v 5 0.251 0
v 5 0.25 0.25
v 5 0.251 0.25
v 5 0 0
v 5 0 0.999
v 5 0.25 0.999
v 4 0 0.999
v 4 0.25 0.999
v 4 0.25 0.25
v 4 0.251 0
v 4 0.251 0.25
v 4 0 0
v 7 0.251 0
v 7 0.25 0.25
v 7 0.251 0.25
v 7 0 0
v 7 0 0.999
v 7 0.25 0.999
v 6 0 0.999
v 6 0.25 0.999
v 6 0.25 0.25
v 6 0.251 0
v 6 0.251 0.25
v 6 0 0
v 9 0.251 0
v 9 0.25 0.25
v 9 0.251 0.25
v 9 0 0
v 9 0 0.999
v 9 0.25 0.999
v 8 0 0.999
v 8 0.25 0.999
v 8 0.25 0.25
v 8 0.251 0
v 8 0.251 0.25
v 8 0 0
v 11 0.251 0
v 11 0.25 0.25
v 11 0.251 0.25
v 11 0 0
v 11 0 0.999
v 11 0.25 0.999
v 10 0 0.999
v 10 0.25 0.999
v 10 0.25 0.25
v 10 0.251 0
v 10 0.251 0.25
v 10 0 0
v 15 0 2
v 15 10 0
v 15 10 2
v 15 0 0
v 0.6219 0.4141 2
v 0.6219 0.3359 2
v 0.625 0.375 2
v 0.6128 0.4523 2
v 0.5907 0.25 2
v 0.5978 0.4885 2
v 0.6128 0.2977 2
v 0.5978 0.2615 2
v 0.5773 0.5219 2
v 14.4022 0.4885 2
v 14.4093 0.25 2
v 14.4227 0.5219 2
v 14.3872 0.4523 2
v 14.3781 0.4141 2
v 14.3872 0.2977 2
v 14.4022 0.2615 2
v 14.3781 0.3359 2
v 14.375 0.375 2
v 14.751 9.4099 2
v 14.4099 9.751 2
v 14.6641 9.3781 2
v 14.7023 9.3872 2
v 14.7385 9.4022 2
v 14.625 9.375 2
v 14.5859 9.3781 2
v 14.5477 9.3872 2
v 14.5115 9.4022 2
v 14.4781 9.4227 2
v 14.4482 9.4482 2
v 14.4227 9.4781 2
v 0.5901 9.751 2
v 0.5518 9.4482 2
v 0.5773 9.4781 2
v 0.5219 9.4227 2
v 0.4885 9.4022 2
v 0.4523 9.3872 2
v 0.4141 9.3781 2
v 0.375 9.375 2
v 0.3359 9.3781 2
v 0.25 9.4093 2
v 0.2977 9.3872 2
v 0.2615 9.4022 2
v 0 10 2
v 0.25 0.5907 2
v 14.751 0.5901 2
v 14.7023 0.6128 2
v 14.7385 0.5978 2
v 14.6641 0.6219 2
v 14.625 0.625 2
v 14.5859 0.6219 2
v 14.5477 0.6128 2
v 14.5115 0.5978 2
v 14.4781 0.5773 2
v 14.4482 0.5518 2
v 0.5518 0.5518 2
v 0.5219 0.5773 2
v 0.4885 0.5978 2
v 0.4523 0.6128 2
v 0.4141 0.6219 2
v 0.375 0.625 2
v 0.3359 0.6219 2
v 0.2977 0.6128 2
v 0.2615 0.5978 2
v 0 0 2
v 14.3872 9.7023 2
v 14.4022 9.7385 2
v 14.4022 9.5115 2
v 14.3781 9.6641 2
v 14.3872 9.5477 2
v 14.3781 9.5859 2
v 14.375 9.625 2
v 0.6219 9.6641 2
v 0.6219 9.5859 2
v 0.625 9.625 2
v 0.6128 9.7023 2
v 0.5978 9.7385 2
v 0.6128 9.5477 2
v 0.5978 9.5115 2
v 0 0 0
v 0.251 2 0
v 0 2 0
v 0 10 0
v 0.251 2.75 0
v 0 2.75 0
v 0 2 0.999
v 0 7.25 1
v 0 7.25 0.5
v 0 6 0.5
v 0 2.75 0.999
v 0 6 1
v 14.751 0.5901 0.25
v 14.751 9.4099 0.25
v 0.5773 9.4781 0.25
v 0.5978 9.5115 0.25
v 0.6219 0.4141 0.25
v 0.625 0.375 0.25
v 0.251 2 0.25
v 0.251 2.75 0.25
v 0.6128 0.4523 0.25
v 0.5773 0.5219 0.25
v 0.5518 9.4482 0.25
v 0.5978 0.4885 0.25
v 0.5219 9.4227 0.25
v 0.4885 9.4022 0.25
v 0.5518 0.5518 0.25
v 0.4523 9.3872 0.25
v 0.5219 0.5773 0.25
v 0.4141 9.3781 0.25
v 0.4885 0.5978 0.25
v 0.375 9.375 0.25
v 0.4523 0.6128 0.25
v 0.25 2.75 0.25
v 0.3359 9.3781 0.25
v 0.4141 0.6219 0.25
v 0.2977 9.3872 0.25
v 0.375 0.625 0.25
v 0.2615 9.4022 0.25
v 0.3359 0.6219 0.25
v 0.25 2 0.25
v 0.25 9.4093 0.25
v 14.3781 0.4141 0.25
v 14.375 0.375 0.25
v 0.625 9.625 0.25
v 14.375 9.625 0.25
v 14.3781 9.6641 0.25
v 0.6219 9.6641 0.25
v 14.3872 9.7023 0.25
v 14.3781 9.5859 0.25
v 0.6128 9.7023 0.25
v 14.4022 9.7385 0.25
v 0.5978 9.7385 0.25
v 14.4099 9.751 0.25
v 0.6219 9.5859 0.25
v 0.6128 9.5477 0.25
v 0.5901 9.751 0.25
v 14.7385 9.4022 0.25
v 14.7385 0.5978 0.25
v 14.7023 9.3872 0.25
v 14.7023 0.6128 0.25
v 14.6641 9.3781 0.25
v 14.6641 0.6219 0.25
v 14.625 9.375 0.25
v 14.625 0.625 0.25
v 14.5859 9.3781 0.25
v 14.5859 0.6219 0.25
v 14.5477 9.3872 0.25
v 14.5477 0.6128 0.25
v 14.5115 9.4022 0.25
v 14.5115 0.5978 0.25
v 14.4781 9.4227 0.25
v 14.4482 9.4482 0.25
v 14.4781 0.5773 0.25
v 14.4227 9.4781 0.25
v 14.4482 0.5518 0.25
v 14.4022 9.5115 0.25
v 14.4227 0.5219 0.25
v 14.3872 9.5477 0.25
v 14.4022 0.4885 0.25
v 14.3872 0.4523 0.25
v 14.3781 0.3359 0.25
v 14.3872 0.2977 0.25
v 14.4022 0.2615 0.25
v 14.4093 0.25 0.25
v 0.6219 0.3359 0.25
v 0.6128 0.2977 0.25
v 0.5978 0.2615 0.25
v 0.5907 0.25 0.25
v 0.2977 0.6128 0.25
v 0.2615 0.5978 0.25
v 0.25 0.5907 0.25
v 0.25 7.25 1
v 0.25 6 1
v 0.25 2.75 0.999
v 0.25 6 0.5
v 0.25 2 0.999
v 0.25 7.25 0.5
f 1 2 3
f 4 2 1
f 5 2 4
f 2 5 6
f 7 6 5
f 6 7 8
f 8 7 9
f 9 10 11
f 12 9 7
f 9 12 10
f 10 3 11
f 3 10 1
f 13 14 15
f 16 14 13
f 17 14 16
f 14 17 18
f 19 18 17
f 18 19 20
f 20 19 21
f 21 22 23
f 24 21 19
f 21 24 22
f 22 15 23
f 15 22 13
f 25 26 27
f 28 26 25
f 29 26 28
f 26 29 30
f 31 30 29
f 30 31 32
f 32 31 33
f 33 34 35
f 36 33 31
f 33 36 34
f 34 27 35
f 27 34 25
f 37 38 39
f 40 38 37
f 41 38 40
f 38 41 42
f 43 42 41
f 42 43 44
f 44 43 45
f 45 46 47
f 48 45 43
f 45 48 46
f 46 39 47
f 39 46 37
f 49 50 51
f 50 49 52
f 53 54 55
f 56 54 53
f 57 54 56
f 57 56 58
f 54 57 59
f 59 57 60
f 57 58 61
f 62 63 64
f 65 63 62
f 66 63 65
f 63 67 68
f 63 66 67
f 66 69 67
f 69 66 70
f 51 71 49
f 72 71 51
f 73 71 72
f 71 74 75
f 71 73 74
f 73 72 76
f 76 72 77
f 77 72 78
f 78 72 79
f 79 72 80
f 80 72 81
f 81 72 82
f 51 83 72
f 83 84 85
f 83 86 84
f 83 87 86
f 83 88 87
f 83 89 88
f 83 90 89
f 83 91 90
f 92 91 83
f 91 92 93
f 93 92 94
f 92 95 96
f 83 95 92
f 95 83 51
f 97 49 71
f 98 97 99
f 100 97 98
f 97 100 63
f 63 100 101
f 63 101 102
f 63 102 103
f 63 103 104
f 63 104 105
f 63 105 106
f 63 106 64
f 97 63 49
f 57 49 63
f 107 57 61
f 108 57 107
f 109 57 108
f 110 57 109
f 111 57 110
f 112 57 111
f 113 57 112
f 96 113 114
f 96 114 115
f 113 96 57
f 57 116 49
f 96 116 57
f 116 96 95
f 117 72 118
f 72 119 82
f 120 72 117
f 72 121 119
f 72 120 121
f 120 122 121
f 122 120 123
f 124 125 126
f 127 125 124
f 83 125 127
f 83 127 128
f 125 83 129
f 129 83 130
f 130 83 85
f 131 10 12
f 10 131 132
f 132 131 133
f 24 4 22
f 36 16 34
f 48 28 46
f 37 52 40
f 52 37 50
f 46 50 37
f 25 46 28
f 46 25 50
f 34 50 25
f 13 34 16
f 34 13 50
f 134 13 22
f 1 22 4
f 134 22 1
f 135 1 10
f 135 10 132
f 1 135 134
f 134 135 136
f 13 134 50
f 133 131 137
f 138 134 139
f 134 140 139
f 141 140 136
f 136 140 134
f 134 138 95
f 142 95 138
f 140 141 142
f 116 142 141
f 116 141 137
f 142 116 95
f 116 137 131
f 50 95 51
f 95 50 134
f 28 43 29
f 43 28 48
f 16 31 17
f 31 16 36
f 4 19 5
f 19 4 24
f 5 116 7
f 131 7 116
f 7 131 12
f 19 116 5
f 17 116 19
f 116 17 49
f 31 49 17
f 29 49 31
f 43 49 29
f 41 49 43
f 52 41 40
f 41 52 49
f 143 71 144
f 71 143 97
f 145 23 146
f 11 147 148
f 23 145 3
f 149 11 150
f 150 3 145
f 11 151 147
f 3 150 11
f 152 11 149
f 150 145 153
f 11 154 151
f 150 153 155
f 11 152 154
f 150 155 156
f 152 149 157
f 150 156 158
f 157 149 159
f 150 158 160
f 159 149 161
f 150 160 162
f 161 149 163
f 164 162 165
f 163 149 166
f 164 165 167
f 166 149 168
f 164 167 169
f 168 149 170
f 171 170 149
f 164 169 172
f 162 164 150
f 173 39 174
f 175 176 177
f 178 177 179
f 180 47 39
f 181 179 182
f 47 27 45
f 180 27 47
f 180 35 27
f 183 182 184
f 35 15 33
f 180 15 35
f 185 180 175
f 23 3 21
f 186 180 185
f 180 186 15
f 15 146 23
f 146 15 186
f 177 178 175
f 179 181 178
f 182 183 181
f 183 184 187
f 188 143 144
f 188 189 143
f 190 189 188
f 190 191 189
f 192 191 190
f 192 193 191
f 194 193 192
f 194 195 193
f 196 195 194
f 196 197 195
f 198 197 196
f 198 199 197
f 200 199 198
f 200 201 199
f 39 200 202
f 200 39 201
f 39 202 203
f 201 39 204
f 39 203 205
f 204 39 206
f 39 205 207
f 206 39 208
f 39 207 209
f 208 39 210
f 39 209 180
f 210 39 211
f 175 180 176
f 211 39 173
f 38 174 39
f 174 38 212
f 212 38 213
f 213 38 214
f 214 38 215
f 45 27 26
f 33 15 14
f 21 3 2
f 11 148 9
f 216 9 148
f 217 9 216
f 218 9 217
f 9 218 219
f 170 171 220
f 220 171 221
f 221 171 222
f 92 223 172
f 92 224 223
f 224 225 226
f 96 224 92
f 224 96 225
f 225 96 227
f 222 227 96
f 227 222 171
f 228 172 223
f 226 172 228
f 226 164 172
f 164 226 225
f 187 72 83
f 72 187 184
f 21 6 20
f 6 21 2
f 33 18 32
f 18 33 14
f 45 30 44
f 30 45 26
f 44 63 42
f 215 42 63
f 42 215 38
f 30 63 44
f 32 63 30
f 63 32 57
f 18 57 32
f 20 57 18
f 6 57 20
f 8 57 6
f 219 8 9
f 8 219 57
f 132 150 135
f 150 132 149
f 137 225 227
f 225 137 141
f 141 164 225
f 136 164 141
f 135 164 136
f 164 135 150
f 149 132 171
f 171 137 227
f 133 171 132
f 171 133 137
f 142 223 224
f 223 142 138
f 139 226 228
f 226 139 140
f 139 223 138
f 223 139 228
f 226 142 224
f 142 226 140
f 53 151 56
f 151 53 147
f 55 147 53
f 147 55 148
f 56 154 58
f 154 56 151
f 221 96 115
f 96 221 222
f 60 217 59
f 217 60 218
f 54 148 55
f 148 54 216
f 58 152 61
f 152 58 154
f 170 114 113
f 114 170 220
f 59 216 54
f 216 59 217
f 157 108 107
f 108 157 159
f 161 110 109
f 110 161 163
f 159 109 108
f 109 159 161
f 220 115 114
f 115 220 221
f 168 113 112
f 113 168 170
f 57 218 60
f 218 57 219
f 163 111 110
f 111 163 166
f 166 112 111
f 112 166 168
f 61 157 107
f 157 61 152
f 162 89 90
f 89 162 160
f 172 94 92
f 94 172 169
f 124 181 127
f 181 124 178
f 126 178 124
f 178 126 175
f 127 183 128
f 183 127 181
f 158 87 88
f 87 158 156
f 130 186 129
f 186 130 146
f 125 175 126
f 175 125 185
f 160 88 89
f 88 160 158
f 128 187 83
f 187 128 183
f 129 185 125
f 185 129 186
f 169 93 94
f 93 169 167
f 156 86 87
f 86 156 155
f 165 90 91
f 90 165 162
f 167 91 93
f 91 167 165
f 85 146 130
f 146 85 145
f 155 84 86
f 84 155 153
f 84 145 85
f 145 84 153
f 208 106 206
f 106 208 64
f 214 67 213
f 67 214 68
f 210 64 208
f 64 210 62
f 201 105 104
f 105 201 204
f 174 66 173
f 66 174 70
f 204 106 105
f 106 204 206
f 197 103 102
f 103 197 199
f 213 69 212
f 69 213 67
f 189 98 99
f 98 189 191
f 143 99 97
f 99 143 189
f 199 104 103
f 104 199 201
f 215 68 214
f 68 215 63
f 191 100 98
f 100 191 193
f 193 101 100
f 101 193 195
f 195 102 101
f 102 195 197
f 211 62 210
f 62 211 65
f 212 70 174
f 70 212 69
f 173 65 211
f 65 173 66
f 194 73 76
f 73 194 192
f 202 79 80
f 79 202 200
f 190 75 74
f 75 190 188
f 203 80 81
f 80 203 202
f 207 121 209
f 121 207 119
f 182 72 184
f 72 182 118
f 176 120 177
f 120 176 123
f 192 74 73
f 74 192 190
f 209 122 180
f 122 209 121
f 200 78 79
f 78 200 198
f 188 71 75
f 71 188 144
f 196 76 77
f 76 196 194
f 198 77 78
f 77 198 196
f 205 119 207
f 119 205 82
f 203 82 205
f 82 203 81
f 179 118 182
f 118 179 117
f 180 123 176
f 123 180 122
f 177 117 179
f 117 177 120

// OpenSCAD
a = 15;
b = 10;
c = 2;
t = 0.25;
socket_h = 1;
socket_w = 1;
socket_n = 4;
socket_int = 1;
eps = 1e-3;
usb_type_b_w = 0.75;
usb_type_b_h = 1;
usb_type_a_w = 1.25;
usb_type_a_h = 0.5;
start_socket = (a-(socket_w+socket_int)*socket_n+socket_w)/2;

difference() {
    cube([a,b,c], false);
    translate([t,t,t]) {
        cube([a-2*t+eps, b-2*t+eps, c-t+eps], false);
    }
    for (i = [0:1:socket_n-1]) {
        translate([start_socket+i*(socket_w+socket_int), -eps, -eps]) {
            cube(size=[socket_w, t+2*eps, socket_h]);
        }
    }
    
    translate([-eps, 2, -eps]) {
        cube(size=[t+2*eps, usb_type_b_w, usb_type_b_h]);
    }
    translate([-eps, 6, 0.5]) {
        cube(size=[t+2*eps, usb_type_a_w, usb_type_a_h]);
    }
};

leg_r = t;
shift = t/2+leg_r;
for (dx = [shift, a-shift])
    for (dy = [shift, b-shift]) {
        translate([dx, dy, 0]) {
            cylinder(h=c, r=leg_r, $fn=40);
        }
    }
